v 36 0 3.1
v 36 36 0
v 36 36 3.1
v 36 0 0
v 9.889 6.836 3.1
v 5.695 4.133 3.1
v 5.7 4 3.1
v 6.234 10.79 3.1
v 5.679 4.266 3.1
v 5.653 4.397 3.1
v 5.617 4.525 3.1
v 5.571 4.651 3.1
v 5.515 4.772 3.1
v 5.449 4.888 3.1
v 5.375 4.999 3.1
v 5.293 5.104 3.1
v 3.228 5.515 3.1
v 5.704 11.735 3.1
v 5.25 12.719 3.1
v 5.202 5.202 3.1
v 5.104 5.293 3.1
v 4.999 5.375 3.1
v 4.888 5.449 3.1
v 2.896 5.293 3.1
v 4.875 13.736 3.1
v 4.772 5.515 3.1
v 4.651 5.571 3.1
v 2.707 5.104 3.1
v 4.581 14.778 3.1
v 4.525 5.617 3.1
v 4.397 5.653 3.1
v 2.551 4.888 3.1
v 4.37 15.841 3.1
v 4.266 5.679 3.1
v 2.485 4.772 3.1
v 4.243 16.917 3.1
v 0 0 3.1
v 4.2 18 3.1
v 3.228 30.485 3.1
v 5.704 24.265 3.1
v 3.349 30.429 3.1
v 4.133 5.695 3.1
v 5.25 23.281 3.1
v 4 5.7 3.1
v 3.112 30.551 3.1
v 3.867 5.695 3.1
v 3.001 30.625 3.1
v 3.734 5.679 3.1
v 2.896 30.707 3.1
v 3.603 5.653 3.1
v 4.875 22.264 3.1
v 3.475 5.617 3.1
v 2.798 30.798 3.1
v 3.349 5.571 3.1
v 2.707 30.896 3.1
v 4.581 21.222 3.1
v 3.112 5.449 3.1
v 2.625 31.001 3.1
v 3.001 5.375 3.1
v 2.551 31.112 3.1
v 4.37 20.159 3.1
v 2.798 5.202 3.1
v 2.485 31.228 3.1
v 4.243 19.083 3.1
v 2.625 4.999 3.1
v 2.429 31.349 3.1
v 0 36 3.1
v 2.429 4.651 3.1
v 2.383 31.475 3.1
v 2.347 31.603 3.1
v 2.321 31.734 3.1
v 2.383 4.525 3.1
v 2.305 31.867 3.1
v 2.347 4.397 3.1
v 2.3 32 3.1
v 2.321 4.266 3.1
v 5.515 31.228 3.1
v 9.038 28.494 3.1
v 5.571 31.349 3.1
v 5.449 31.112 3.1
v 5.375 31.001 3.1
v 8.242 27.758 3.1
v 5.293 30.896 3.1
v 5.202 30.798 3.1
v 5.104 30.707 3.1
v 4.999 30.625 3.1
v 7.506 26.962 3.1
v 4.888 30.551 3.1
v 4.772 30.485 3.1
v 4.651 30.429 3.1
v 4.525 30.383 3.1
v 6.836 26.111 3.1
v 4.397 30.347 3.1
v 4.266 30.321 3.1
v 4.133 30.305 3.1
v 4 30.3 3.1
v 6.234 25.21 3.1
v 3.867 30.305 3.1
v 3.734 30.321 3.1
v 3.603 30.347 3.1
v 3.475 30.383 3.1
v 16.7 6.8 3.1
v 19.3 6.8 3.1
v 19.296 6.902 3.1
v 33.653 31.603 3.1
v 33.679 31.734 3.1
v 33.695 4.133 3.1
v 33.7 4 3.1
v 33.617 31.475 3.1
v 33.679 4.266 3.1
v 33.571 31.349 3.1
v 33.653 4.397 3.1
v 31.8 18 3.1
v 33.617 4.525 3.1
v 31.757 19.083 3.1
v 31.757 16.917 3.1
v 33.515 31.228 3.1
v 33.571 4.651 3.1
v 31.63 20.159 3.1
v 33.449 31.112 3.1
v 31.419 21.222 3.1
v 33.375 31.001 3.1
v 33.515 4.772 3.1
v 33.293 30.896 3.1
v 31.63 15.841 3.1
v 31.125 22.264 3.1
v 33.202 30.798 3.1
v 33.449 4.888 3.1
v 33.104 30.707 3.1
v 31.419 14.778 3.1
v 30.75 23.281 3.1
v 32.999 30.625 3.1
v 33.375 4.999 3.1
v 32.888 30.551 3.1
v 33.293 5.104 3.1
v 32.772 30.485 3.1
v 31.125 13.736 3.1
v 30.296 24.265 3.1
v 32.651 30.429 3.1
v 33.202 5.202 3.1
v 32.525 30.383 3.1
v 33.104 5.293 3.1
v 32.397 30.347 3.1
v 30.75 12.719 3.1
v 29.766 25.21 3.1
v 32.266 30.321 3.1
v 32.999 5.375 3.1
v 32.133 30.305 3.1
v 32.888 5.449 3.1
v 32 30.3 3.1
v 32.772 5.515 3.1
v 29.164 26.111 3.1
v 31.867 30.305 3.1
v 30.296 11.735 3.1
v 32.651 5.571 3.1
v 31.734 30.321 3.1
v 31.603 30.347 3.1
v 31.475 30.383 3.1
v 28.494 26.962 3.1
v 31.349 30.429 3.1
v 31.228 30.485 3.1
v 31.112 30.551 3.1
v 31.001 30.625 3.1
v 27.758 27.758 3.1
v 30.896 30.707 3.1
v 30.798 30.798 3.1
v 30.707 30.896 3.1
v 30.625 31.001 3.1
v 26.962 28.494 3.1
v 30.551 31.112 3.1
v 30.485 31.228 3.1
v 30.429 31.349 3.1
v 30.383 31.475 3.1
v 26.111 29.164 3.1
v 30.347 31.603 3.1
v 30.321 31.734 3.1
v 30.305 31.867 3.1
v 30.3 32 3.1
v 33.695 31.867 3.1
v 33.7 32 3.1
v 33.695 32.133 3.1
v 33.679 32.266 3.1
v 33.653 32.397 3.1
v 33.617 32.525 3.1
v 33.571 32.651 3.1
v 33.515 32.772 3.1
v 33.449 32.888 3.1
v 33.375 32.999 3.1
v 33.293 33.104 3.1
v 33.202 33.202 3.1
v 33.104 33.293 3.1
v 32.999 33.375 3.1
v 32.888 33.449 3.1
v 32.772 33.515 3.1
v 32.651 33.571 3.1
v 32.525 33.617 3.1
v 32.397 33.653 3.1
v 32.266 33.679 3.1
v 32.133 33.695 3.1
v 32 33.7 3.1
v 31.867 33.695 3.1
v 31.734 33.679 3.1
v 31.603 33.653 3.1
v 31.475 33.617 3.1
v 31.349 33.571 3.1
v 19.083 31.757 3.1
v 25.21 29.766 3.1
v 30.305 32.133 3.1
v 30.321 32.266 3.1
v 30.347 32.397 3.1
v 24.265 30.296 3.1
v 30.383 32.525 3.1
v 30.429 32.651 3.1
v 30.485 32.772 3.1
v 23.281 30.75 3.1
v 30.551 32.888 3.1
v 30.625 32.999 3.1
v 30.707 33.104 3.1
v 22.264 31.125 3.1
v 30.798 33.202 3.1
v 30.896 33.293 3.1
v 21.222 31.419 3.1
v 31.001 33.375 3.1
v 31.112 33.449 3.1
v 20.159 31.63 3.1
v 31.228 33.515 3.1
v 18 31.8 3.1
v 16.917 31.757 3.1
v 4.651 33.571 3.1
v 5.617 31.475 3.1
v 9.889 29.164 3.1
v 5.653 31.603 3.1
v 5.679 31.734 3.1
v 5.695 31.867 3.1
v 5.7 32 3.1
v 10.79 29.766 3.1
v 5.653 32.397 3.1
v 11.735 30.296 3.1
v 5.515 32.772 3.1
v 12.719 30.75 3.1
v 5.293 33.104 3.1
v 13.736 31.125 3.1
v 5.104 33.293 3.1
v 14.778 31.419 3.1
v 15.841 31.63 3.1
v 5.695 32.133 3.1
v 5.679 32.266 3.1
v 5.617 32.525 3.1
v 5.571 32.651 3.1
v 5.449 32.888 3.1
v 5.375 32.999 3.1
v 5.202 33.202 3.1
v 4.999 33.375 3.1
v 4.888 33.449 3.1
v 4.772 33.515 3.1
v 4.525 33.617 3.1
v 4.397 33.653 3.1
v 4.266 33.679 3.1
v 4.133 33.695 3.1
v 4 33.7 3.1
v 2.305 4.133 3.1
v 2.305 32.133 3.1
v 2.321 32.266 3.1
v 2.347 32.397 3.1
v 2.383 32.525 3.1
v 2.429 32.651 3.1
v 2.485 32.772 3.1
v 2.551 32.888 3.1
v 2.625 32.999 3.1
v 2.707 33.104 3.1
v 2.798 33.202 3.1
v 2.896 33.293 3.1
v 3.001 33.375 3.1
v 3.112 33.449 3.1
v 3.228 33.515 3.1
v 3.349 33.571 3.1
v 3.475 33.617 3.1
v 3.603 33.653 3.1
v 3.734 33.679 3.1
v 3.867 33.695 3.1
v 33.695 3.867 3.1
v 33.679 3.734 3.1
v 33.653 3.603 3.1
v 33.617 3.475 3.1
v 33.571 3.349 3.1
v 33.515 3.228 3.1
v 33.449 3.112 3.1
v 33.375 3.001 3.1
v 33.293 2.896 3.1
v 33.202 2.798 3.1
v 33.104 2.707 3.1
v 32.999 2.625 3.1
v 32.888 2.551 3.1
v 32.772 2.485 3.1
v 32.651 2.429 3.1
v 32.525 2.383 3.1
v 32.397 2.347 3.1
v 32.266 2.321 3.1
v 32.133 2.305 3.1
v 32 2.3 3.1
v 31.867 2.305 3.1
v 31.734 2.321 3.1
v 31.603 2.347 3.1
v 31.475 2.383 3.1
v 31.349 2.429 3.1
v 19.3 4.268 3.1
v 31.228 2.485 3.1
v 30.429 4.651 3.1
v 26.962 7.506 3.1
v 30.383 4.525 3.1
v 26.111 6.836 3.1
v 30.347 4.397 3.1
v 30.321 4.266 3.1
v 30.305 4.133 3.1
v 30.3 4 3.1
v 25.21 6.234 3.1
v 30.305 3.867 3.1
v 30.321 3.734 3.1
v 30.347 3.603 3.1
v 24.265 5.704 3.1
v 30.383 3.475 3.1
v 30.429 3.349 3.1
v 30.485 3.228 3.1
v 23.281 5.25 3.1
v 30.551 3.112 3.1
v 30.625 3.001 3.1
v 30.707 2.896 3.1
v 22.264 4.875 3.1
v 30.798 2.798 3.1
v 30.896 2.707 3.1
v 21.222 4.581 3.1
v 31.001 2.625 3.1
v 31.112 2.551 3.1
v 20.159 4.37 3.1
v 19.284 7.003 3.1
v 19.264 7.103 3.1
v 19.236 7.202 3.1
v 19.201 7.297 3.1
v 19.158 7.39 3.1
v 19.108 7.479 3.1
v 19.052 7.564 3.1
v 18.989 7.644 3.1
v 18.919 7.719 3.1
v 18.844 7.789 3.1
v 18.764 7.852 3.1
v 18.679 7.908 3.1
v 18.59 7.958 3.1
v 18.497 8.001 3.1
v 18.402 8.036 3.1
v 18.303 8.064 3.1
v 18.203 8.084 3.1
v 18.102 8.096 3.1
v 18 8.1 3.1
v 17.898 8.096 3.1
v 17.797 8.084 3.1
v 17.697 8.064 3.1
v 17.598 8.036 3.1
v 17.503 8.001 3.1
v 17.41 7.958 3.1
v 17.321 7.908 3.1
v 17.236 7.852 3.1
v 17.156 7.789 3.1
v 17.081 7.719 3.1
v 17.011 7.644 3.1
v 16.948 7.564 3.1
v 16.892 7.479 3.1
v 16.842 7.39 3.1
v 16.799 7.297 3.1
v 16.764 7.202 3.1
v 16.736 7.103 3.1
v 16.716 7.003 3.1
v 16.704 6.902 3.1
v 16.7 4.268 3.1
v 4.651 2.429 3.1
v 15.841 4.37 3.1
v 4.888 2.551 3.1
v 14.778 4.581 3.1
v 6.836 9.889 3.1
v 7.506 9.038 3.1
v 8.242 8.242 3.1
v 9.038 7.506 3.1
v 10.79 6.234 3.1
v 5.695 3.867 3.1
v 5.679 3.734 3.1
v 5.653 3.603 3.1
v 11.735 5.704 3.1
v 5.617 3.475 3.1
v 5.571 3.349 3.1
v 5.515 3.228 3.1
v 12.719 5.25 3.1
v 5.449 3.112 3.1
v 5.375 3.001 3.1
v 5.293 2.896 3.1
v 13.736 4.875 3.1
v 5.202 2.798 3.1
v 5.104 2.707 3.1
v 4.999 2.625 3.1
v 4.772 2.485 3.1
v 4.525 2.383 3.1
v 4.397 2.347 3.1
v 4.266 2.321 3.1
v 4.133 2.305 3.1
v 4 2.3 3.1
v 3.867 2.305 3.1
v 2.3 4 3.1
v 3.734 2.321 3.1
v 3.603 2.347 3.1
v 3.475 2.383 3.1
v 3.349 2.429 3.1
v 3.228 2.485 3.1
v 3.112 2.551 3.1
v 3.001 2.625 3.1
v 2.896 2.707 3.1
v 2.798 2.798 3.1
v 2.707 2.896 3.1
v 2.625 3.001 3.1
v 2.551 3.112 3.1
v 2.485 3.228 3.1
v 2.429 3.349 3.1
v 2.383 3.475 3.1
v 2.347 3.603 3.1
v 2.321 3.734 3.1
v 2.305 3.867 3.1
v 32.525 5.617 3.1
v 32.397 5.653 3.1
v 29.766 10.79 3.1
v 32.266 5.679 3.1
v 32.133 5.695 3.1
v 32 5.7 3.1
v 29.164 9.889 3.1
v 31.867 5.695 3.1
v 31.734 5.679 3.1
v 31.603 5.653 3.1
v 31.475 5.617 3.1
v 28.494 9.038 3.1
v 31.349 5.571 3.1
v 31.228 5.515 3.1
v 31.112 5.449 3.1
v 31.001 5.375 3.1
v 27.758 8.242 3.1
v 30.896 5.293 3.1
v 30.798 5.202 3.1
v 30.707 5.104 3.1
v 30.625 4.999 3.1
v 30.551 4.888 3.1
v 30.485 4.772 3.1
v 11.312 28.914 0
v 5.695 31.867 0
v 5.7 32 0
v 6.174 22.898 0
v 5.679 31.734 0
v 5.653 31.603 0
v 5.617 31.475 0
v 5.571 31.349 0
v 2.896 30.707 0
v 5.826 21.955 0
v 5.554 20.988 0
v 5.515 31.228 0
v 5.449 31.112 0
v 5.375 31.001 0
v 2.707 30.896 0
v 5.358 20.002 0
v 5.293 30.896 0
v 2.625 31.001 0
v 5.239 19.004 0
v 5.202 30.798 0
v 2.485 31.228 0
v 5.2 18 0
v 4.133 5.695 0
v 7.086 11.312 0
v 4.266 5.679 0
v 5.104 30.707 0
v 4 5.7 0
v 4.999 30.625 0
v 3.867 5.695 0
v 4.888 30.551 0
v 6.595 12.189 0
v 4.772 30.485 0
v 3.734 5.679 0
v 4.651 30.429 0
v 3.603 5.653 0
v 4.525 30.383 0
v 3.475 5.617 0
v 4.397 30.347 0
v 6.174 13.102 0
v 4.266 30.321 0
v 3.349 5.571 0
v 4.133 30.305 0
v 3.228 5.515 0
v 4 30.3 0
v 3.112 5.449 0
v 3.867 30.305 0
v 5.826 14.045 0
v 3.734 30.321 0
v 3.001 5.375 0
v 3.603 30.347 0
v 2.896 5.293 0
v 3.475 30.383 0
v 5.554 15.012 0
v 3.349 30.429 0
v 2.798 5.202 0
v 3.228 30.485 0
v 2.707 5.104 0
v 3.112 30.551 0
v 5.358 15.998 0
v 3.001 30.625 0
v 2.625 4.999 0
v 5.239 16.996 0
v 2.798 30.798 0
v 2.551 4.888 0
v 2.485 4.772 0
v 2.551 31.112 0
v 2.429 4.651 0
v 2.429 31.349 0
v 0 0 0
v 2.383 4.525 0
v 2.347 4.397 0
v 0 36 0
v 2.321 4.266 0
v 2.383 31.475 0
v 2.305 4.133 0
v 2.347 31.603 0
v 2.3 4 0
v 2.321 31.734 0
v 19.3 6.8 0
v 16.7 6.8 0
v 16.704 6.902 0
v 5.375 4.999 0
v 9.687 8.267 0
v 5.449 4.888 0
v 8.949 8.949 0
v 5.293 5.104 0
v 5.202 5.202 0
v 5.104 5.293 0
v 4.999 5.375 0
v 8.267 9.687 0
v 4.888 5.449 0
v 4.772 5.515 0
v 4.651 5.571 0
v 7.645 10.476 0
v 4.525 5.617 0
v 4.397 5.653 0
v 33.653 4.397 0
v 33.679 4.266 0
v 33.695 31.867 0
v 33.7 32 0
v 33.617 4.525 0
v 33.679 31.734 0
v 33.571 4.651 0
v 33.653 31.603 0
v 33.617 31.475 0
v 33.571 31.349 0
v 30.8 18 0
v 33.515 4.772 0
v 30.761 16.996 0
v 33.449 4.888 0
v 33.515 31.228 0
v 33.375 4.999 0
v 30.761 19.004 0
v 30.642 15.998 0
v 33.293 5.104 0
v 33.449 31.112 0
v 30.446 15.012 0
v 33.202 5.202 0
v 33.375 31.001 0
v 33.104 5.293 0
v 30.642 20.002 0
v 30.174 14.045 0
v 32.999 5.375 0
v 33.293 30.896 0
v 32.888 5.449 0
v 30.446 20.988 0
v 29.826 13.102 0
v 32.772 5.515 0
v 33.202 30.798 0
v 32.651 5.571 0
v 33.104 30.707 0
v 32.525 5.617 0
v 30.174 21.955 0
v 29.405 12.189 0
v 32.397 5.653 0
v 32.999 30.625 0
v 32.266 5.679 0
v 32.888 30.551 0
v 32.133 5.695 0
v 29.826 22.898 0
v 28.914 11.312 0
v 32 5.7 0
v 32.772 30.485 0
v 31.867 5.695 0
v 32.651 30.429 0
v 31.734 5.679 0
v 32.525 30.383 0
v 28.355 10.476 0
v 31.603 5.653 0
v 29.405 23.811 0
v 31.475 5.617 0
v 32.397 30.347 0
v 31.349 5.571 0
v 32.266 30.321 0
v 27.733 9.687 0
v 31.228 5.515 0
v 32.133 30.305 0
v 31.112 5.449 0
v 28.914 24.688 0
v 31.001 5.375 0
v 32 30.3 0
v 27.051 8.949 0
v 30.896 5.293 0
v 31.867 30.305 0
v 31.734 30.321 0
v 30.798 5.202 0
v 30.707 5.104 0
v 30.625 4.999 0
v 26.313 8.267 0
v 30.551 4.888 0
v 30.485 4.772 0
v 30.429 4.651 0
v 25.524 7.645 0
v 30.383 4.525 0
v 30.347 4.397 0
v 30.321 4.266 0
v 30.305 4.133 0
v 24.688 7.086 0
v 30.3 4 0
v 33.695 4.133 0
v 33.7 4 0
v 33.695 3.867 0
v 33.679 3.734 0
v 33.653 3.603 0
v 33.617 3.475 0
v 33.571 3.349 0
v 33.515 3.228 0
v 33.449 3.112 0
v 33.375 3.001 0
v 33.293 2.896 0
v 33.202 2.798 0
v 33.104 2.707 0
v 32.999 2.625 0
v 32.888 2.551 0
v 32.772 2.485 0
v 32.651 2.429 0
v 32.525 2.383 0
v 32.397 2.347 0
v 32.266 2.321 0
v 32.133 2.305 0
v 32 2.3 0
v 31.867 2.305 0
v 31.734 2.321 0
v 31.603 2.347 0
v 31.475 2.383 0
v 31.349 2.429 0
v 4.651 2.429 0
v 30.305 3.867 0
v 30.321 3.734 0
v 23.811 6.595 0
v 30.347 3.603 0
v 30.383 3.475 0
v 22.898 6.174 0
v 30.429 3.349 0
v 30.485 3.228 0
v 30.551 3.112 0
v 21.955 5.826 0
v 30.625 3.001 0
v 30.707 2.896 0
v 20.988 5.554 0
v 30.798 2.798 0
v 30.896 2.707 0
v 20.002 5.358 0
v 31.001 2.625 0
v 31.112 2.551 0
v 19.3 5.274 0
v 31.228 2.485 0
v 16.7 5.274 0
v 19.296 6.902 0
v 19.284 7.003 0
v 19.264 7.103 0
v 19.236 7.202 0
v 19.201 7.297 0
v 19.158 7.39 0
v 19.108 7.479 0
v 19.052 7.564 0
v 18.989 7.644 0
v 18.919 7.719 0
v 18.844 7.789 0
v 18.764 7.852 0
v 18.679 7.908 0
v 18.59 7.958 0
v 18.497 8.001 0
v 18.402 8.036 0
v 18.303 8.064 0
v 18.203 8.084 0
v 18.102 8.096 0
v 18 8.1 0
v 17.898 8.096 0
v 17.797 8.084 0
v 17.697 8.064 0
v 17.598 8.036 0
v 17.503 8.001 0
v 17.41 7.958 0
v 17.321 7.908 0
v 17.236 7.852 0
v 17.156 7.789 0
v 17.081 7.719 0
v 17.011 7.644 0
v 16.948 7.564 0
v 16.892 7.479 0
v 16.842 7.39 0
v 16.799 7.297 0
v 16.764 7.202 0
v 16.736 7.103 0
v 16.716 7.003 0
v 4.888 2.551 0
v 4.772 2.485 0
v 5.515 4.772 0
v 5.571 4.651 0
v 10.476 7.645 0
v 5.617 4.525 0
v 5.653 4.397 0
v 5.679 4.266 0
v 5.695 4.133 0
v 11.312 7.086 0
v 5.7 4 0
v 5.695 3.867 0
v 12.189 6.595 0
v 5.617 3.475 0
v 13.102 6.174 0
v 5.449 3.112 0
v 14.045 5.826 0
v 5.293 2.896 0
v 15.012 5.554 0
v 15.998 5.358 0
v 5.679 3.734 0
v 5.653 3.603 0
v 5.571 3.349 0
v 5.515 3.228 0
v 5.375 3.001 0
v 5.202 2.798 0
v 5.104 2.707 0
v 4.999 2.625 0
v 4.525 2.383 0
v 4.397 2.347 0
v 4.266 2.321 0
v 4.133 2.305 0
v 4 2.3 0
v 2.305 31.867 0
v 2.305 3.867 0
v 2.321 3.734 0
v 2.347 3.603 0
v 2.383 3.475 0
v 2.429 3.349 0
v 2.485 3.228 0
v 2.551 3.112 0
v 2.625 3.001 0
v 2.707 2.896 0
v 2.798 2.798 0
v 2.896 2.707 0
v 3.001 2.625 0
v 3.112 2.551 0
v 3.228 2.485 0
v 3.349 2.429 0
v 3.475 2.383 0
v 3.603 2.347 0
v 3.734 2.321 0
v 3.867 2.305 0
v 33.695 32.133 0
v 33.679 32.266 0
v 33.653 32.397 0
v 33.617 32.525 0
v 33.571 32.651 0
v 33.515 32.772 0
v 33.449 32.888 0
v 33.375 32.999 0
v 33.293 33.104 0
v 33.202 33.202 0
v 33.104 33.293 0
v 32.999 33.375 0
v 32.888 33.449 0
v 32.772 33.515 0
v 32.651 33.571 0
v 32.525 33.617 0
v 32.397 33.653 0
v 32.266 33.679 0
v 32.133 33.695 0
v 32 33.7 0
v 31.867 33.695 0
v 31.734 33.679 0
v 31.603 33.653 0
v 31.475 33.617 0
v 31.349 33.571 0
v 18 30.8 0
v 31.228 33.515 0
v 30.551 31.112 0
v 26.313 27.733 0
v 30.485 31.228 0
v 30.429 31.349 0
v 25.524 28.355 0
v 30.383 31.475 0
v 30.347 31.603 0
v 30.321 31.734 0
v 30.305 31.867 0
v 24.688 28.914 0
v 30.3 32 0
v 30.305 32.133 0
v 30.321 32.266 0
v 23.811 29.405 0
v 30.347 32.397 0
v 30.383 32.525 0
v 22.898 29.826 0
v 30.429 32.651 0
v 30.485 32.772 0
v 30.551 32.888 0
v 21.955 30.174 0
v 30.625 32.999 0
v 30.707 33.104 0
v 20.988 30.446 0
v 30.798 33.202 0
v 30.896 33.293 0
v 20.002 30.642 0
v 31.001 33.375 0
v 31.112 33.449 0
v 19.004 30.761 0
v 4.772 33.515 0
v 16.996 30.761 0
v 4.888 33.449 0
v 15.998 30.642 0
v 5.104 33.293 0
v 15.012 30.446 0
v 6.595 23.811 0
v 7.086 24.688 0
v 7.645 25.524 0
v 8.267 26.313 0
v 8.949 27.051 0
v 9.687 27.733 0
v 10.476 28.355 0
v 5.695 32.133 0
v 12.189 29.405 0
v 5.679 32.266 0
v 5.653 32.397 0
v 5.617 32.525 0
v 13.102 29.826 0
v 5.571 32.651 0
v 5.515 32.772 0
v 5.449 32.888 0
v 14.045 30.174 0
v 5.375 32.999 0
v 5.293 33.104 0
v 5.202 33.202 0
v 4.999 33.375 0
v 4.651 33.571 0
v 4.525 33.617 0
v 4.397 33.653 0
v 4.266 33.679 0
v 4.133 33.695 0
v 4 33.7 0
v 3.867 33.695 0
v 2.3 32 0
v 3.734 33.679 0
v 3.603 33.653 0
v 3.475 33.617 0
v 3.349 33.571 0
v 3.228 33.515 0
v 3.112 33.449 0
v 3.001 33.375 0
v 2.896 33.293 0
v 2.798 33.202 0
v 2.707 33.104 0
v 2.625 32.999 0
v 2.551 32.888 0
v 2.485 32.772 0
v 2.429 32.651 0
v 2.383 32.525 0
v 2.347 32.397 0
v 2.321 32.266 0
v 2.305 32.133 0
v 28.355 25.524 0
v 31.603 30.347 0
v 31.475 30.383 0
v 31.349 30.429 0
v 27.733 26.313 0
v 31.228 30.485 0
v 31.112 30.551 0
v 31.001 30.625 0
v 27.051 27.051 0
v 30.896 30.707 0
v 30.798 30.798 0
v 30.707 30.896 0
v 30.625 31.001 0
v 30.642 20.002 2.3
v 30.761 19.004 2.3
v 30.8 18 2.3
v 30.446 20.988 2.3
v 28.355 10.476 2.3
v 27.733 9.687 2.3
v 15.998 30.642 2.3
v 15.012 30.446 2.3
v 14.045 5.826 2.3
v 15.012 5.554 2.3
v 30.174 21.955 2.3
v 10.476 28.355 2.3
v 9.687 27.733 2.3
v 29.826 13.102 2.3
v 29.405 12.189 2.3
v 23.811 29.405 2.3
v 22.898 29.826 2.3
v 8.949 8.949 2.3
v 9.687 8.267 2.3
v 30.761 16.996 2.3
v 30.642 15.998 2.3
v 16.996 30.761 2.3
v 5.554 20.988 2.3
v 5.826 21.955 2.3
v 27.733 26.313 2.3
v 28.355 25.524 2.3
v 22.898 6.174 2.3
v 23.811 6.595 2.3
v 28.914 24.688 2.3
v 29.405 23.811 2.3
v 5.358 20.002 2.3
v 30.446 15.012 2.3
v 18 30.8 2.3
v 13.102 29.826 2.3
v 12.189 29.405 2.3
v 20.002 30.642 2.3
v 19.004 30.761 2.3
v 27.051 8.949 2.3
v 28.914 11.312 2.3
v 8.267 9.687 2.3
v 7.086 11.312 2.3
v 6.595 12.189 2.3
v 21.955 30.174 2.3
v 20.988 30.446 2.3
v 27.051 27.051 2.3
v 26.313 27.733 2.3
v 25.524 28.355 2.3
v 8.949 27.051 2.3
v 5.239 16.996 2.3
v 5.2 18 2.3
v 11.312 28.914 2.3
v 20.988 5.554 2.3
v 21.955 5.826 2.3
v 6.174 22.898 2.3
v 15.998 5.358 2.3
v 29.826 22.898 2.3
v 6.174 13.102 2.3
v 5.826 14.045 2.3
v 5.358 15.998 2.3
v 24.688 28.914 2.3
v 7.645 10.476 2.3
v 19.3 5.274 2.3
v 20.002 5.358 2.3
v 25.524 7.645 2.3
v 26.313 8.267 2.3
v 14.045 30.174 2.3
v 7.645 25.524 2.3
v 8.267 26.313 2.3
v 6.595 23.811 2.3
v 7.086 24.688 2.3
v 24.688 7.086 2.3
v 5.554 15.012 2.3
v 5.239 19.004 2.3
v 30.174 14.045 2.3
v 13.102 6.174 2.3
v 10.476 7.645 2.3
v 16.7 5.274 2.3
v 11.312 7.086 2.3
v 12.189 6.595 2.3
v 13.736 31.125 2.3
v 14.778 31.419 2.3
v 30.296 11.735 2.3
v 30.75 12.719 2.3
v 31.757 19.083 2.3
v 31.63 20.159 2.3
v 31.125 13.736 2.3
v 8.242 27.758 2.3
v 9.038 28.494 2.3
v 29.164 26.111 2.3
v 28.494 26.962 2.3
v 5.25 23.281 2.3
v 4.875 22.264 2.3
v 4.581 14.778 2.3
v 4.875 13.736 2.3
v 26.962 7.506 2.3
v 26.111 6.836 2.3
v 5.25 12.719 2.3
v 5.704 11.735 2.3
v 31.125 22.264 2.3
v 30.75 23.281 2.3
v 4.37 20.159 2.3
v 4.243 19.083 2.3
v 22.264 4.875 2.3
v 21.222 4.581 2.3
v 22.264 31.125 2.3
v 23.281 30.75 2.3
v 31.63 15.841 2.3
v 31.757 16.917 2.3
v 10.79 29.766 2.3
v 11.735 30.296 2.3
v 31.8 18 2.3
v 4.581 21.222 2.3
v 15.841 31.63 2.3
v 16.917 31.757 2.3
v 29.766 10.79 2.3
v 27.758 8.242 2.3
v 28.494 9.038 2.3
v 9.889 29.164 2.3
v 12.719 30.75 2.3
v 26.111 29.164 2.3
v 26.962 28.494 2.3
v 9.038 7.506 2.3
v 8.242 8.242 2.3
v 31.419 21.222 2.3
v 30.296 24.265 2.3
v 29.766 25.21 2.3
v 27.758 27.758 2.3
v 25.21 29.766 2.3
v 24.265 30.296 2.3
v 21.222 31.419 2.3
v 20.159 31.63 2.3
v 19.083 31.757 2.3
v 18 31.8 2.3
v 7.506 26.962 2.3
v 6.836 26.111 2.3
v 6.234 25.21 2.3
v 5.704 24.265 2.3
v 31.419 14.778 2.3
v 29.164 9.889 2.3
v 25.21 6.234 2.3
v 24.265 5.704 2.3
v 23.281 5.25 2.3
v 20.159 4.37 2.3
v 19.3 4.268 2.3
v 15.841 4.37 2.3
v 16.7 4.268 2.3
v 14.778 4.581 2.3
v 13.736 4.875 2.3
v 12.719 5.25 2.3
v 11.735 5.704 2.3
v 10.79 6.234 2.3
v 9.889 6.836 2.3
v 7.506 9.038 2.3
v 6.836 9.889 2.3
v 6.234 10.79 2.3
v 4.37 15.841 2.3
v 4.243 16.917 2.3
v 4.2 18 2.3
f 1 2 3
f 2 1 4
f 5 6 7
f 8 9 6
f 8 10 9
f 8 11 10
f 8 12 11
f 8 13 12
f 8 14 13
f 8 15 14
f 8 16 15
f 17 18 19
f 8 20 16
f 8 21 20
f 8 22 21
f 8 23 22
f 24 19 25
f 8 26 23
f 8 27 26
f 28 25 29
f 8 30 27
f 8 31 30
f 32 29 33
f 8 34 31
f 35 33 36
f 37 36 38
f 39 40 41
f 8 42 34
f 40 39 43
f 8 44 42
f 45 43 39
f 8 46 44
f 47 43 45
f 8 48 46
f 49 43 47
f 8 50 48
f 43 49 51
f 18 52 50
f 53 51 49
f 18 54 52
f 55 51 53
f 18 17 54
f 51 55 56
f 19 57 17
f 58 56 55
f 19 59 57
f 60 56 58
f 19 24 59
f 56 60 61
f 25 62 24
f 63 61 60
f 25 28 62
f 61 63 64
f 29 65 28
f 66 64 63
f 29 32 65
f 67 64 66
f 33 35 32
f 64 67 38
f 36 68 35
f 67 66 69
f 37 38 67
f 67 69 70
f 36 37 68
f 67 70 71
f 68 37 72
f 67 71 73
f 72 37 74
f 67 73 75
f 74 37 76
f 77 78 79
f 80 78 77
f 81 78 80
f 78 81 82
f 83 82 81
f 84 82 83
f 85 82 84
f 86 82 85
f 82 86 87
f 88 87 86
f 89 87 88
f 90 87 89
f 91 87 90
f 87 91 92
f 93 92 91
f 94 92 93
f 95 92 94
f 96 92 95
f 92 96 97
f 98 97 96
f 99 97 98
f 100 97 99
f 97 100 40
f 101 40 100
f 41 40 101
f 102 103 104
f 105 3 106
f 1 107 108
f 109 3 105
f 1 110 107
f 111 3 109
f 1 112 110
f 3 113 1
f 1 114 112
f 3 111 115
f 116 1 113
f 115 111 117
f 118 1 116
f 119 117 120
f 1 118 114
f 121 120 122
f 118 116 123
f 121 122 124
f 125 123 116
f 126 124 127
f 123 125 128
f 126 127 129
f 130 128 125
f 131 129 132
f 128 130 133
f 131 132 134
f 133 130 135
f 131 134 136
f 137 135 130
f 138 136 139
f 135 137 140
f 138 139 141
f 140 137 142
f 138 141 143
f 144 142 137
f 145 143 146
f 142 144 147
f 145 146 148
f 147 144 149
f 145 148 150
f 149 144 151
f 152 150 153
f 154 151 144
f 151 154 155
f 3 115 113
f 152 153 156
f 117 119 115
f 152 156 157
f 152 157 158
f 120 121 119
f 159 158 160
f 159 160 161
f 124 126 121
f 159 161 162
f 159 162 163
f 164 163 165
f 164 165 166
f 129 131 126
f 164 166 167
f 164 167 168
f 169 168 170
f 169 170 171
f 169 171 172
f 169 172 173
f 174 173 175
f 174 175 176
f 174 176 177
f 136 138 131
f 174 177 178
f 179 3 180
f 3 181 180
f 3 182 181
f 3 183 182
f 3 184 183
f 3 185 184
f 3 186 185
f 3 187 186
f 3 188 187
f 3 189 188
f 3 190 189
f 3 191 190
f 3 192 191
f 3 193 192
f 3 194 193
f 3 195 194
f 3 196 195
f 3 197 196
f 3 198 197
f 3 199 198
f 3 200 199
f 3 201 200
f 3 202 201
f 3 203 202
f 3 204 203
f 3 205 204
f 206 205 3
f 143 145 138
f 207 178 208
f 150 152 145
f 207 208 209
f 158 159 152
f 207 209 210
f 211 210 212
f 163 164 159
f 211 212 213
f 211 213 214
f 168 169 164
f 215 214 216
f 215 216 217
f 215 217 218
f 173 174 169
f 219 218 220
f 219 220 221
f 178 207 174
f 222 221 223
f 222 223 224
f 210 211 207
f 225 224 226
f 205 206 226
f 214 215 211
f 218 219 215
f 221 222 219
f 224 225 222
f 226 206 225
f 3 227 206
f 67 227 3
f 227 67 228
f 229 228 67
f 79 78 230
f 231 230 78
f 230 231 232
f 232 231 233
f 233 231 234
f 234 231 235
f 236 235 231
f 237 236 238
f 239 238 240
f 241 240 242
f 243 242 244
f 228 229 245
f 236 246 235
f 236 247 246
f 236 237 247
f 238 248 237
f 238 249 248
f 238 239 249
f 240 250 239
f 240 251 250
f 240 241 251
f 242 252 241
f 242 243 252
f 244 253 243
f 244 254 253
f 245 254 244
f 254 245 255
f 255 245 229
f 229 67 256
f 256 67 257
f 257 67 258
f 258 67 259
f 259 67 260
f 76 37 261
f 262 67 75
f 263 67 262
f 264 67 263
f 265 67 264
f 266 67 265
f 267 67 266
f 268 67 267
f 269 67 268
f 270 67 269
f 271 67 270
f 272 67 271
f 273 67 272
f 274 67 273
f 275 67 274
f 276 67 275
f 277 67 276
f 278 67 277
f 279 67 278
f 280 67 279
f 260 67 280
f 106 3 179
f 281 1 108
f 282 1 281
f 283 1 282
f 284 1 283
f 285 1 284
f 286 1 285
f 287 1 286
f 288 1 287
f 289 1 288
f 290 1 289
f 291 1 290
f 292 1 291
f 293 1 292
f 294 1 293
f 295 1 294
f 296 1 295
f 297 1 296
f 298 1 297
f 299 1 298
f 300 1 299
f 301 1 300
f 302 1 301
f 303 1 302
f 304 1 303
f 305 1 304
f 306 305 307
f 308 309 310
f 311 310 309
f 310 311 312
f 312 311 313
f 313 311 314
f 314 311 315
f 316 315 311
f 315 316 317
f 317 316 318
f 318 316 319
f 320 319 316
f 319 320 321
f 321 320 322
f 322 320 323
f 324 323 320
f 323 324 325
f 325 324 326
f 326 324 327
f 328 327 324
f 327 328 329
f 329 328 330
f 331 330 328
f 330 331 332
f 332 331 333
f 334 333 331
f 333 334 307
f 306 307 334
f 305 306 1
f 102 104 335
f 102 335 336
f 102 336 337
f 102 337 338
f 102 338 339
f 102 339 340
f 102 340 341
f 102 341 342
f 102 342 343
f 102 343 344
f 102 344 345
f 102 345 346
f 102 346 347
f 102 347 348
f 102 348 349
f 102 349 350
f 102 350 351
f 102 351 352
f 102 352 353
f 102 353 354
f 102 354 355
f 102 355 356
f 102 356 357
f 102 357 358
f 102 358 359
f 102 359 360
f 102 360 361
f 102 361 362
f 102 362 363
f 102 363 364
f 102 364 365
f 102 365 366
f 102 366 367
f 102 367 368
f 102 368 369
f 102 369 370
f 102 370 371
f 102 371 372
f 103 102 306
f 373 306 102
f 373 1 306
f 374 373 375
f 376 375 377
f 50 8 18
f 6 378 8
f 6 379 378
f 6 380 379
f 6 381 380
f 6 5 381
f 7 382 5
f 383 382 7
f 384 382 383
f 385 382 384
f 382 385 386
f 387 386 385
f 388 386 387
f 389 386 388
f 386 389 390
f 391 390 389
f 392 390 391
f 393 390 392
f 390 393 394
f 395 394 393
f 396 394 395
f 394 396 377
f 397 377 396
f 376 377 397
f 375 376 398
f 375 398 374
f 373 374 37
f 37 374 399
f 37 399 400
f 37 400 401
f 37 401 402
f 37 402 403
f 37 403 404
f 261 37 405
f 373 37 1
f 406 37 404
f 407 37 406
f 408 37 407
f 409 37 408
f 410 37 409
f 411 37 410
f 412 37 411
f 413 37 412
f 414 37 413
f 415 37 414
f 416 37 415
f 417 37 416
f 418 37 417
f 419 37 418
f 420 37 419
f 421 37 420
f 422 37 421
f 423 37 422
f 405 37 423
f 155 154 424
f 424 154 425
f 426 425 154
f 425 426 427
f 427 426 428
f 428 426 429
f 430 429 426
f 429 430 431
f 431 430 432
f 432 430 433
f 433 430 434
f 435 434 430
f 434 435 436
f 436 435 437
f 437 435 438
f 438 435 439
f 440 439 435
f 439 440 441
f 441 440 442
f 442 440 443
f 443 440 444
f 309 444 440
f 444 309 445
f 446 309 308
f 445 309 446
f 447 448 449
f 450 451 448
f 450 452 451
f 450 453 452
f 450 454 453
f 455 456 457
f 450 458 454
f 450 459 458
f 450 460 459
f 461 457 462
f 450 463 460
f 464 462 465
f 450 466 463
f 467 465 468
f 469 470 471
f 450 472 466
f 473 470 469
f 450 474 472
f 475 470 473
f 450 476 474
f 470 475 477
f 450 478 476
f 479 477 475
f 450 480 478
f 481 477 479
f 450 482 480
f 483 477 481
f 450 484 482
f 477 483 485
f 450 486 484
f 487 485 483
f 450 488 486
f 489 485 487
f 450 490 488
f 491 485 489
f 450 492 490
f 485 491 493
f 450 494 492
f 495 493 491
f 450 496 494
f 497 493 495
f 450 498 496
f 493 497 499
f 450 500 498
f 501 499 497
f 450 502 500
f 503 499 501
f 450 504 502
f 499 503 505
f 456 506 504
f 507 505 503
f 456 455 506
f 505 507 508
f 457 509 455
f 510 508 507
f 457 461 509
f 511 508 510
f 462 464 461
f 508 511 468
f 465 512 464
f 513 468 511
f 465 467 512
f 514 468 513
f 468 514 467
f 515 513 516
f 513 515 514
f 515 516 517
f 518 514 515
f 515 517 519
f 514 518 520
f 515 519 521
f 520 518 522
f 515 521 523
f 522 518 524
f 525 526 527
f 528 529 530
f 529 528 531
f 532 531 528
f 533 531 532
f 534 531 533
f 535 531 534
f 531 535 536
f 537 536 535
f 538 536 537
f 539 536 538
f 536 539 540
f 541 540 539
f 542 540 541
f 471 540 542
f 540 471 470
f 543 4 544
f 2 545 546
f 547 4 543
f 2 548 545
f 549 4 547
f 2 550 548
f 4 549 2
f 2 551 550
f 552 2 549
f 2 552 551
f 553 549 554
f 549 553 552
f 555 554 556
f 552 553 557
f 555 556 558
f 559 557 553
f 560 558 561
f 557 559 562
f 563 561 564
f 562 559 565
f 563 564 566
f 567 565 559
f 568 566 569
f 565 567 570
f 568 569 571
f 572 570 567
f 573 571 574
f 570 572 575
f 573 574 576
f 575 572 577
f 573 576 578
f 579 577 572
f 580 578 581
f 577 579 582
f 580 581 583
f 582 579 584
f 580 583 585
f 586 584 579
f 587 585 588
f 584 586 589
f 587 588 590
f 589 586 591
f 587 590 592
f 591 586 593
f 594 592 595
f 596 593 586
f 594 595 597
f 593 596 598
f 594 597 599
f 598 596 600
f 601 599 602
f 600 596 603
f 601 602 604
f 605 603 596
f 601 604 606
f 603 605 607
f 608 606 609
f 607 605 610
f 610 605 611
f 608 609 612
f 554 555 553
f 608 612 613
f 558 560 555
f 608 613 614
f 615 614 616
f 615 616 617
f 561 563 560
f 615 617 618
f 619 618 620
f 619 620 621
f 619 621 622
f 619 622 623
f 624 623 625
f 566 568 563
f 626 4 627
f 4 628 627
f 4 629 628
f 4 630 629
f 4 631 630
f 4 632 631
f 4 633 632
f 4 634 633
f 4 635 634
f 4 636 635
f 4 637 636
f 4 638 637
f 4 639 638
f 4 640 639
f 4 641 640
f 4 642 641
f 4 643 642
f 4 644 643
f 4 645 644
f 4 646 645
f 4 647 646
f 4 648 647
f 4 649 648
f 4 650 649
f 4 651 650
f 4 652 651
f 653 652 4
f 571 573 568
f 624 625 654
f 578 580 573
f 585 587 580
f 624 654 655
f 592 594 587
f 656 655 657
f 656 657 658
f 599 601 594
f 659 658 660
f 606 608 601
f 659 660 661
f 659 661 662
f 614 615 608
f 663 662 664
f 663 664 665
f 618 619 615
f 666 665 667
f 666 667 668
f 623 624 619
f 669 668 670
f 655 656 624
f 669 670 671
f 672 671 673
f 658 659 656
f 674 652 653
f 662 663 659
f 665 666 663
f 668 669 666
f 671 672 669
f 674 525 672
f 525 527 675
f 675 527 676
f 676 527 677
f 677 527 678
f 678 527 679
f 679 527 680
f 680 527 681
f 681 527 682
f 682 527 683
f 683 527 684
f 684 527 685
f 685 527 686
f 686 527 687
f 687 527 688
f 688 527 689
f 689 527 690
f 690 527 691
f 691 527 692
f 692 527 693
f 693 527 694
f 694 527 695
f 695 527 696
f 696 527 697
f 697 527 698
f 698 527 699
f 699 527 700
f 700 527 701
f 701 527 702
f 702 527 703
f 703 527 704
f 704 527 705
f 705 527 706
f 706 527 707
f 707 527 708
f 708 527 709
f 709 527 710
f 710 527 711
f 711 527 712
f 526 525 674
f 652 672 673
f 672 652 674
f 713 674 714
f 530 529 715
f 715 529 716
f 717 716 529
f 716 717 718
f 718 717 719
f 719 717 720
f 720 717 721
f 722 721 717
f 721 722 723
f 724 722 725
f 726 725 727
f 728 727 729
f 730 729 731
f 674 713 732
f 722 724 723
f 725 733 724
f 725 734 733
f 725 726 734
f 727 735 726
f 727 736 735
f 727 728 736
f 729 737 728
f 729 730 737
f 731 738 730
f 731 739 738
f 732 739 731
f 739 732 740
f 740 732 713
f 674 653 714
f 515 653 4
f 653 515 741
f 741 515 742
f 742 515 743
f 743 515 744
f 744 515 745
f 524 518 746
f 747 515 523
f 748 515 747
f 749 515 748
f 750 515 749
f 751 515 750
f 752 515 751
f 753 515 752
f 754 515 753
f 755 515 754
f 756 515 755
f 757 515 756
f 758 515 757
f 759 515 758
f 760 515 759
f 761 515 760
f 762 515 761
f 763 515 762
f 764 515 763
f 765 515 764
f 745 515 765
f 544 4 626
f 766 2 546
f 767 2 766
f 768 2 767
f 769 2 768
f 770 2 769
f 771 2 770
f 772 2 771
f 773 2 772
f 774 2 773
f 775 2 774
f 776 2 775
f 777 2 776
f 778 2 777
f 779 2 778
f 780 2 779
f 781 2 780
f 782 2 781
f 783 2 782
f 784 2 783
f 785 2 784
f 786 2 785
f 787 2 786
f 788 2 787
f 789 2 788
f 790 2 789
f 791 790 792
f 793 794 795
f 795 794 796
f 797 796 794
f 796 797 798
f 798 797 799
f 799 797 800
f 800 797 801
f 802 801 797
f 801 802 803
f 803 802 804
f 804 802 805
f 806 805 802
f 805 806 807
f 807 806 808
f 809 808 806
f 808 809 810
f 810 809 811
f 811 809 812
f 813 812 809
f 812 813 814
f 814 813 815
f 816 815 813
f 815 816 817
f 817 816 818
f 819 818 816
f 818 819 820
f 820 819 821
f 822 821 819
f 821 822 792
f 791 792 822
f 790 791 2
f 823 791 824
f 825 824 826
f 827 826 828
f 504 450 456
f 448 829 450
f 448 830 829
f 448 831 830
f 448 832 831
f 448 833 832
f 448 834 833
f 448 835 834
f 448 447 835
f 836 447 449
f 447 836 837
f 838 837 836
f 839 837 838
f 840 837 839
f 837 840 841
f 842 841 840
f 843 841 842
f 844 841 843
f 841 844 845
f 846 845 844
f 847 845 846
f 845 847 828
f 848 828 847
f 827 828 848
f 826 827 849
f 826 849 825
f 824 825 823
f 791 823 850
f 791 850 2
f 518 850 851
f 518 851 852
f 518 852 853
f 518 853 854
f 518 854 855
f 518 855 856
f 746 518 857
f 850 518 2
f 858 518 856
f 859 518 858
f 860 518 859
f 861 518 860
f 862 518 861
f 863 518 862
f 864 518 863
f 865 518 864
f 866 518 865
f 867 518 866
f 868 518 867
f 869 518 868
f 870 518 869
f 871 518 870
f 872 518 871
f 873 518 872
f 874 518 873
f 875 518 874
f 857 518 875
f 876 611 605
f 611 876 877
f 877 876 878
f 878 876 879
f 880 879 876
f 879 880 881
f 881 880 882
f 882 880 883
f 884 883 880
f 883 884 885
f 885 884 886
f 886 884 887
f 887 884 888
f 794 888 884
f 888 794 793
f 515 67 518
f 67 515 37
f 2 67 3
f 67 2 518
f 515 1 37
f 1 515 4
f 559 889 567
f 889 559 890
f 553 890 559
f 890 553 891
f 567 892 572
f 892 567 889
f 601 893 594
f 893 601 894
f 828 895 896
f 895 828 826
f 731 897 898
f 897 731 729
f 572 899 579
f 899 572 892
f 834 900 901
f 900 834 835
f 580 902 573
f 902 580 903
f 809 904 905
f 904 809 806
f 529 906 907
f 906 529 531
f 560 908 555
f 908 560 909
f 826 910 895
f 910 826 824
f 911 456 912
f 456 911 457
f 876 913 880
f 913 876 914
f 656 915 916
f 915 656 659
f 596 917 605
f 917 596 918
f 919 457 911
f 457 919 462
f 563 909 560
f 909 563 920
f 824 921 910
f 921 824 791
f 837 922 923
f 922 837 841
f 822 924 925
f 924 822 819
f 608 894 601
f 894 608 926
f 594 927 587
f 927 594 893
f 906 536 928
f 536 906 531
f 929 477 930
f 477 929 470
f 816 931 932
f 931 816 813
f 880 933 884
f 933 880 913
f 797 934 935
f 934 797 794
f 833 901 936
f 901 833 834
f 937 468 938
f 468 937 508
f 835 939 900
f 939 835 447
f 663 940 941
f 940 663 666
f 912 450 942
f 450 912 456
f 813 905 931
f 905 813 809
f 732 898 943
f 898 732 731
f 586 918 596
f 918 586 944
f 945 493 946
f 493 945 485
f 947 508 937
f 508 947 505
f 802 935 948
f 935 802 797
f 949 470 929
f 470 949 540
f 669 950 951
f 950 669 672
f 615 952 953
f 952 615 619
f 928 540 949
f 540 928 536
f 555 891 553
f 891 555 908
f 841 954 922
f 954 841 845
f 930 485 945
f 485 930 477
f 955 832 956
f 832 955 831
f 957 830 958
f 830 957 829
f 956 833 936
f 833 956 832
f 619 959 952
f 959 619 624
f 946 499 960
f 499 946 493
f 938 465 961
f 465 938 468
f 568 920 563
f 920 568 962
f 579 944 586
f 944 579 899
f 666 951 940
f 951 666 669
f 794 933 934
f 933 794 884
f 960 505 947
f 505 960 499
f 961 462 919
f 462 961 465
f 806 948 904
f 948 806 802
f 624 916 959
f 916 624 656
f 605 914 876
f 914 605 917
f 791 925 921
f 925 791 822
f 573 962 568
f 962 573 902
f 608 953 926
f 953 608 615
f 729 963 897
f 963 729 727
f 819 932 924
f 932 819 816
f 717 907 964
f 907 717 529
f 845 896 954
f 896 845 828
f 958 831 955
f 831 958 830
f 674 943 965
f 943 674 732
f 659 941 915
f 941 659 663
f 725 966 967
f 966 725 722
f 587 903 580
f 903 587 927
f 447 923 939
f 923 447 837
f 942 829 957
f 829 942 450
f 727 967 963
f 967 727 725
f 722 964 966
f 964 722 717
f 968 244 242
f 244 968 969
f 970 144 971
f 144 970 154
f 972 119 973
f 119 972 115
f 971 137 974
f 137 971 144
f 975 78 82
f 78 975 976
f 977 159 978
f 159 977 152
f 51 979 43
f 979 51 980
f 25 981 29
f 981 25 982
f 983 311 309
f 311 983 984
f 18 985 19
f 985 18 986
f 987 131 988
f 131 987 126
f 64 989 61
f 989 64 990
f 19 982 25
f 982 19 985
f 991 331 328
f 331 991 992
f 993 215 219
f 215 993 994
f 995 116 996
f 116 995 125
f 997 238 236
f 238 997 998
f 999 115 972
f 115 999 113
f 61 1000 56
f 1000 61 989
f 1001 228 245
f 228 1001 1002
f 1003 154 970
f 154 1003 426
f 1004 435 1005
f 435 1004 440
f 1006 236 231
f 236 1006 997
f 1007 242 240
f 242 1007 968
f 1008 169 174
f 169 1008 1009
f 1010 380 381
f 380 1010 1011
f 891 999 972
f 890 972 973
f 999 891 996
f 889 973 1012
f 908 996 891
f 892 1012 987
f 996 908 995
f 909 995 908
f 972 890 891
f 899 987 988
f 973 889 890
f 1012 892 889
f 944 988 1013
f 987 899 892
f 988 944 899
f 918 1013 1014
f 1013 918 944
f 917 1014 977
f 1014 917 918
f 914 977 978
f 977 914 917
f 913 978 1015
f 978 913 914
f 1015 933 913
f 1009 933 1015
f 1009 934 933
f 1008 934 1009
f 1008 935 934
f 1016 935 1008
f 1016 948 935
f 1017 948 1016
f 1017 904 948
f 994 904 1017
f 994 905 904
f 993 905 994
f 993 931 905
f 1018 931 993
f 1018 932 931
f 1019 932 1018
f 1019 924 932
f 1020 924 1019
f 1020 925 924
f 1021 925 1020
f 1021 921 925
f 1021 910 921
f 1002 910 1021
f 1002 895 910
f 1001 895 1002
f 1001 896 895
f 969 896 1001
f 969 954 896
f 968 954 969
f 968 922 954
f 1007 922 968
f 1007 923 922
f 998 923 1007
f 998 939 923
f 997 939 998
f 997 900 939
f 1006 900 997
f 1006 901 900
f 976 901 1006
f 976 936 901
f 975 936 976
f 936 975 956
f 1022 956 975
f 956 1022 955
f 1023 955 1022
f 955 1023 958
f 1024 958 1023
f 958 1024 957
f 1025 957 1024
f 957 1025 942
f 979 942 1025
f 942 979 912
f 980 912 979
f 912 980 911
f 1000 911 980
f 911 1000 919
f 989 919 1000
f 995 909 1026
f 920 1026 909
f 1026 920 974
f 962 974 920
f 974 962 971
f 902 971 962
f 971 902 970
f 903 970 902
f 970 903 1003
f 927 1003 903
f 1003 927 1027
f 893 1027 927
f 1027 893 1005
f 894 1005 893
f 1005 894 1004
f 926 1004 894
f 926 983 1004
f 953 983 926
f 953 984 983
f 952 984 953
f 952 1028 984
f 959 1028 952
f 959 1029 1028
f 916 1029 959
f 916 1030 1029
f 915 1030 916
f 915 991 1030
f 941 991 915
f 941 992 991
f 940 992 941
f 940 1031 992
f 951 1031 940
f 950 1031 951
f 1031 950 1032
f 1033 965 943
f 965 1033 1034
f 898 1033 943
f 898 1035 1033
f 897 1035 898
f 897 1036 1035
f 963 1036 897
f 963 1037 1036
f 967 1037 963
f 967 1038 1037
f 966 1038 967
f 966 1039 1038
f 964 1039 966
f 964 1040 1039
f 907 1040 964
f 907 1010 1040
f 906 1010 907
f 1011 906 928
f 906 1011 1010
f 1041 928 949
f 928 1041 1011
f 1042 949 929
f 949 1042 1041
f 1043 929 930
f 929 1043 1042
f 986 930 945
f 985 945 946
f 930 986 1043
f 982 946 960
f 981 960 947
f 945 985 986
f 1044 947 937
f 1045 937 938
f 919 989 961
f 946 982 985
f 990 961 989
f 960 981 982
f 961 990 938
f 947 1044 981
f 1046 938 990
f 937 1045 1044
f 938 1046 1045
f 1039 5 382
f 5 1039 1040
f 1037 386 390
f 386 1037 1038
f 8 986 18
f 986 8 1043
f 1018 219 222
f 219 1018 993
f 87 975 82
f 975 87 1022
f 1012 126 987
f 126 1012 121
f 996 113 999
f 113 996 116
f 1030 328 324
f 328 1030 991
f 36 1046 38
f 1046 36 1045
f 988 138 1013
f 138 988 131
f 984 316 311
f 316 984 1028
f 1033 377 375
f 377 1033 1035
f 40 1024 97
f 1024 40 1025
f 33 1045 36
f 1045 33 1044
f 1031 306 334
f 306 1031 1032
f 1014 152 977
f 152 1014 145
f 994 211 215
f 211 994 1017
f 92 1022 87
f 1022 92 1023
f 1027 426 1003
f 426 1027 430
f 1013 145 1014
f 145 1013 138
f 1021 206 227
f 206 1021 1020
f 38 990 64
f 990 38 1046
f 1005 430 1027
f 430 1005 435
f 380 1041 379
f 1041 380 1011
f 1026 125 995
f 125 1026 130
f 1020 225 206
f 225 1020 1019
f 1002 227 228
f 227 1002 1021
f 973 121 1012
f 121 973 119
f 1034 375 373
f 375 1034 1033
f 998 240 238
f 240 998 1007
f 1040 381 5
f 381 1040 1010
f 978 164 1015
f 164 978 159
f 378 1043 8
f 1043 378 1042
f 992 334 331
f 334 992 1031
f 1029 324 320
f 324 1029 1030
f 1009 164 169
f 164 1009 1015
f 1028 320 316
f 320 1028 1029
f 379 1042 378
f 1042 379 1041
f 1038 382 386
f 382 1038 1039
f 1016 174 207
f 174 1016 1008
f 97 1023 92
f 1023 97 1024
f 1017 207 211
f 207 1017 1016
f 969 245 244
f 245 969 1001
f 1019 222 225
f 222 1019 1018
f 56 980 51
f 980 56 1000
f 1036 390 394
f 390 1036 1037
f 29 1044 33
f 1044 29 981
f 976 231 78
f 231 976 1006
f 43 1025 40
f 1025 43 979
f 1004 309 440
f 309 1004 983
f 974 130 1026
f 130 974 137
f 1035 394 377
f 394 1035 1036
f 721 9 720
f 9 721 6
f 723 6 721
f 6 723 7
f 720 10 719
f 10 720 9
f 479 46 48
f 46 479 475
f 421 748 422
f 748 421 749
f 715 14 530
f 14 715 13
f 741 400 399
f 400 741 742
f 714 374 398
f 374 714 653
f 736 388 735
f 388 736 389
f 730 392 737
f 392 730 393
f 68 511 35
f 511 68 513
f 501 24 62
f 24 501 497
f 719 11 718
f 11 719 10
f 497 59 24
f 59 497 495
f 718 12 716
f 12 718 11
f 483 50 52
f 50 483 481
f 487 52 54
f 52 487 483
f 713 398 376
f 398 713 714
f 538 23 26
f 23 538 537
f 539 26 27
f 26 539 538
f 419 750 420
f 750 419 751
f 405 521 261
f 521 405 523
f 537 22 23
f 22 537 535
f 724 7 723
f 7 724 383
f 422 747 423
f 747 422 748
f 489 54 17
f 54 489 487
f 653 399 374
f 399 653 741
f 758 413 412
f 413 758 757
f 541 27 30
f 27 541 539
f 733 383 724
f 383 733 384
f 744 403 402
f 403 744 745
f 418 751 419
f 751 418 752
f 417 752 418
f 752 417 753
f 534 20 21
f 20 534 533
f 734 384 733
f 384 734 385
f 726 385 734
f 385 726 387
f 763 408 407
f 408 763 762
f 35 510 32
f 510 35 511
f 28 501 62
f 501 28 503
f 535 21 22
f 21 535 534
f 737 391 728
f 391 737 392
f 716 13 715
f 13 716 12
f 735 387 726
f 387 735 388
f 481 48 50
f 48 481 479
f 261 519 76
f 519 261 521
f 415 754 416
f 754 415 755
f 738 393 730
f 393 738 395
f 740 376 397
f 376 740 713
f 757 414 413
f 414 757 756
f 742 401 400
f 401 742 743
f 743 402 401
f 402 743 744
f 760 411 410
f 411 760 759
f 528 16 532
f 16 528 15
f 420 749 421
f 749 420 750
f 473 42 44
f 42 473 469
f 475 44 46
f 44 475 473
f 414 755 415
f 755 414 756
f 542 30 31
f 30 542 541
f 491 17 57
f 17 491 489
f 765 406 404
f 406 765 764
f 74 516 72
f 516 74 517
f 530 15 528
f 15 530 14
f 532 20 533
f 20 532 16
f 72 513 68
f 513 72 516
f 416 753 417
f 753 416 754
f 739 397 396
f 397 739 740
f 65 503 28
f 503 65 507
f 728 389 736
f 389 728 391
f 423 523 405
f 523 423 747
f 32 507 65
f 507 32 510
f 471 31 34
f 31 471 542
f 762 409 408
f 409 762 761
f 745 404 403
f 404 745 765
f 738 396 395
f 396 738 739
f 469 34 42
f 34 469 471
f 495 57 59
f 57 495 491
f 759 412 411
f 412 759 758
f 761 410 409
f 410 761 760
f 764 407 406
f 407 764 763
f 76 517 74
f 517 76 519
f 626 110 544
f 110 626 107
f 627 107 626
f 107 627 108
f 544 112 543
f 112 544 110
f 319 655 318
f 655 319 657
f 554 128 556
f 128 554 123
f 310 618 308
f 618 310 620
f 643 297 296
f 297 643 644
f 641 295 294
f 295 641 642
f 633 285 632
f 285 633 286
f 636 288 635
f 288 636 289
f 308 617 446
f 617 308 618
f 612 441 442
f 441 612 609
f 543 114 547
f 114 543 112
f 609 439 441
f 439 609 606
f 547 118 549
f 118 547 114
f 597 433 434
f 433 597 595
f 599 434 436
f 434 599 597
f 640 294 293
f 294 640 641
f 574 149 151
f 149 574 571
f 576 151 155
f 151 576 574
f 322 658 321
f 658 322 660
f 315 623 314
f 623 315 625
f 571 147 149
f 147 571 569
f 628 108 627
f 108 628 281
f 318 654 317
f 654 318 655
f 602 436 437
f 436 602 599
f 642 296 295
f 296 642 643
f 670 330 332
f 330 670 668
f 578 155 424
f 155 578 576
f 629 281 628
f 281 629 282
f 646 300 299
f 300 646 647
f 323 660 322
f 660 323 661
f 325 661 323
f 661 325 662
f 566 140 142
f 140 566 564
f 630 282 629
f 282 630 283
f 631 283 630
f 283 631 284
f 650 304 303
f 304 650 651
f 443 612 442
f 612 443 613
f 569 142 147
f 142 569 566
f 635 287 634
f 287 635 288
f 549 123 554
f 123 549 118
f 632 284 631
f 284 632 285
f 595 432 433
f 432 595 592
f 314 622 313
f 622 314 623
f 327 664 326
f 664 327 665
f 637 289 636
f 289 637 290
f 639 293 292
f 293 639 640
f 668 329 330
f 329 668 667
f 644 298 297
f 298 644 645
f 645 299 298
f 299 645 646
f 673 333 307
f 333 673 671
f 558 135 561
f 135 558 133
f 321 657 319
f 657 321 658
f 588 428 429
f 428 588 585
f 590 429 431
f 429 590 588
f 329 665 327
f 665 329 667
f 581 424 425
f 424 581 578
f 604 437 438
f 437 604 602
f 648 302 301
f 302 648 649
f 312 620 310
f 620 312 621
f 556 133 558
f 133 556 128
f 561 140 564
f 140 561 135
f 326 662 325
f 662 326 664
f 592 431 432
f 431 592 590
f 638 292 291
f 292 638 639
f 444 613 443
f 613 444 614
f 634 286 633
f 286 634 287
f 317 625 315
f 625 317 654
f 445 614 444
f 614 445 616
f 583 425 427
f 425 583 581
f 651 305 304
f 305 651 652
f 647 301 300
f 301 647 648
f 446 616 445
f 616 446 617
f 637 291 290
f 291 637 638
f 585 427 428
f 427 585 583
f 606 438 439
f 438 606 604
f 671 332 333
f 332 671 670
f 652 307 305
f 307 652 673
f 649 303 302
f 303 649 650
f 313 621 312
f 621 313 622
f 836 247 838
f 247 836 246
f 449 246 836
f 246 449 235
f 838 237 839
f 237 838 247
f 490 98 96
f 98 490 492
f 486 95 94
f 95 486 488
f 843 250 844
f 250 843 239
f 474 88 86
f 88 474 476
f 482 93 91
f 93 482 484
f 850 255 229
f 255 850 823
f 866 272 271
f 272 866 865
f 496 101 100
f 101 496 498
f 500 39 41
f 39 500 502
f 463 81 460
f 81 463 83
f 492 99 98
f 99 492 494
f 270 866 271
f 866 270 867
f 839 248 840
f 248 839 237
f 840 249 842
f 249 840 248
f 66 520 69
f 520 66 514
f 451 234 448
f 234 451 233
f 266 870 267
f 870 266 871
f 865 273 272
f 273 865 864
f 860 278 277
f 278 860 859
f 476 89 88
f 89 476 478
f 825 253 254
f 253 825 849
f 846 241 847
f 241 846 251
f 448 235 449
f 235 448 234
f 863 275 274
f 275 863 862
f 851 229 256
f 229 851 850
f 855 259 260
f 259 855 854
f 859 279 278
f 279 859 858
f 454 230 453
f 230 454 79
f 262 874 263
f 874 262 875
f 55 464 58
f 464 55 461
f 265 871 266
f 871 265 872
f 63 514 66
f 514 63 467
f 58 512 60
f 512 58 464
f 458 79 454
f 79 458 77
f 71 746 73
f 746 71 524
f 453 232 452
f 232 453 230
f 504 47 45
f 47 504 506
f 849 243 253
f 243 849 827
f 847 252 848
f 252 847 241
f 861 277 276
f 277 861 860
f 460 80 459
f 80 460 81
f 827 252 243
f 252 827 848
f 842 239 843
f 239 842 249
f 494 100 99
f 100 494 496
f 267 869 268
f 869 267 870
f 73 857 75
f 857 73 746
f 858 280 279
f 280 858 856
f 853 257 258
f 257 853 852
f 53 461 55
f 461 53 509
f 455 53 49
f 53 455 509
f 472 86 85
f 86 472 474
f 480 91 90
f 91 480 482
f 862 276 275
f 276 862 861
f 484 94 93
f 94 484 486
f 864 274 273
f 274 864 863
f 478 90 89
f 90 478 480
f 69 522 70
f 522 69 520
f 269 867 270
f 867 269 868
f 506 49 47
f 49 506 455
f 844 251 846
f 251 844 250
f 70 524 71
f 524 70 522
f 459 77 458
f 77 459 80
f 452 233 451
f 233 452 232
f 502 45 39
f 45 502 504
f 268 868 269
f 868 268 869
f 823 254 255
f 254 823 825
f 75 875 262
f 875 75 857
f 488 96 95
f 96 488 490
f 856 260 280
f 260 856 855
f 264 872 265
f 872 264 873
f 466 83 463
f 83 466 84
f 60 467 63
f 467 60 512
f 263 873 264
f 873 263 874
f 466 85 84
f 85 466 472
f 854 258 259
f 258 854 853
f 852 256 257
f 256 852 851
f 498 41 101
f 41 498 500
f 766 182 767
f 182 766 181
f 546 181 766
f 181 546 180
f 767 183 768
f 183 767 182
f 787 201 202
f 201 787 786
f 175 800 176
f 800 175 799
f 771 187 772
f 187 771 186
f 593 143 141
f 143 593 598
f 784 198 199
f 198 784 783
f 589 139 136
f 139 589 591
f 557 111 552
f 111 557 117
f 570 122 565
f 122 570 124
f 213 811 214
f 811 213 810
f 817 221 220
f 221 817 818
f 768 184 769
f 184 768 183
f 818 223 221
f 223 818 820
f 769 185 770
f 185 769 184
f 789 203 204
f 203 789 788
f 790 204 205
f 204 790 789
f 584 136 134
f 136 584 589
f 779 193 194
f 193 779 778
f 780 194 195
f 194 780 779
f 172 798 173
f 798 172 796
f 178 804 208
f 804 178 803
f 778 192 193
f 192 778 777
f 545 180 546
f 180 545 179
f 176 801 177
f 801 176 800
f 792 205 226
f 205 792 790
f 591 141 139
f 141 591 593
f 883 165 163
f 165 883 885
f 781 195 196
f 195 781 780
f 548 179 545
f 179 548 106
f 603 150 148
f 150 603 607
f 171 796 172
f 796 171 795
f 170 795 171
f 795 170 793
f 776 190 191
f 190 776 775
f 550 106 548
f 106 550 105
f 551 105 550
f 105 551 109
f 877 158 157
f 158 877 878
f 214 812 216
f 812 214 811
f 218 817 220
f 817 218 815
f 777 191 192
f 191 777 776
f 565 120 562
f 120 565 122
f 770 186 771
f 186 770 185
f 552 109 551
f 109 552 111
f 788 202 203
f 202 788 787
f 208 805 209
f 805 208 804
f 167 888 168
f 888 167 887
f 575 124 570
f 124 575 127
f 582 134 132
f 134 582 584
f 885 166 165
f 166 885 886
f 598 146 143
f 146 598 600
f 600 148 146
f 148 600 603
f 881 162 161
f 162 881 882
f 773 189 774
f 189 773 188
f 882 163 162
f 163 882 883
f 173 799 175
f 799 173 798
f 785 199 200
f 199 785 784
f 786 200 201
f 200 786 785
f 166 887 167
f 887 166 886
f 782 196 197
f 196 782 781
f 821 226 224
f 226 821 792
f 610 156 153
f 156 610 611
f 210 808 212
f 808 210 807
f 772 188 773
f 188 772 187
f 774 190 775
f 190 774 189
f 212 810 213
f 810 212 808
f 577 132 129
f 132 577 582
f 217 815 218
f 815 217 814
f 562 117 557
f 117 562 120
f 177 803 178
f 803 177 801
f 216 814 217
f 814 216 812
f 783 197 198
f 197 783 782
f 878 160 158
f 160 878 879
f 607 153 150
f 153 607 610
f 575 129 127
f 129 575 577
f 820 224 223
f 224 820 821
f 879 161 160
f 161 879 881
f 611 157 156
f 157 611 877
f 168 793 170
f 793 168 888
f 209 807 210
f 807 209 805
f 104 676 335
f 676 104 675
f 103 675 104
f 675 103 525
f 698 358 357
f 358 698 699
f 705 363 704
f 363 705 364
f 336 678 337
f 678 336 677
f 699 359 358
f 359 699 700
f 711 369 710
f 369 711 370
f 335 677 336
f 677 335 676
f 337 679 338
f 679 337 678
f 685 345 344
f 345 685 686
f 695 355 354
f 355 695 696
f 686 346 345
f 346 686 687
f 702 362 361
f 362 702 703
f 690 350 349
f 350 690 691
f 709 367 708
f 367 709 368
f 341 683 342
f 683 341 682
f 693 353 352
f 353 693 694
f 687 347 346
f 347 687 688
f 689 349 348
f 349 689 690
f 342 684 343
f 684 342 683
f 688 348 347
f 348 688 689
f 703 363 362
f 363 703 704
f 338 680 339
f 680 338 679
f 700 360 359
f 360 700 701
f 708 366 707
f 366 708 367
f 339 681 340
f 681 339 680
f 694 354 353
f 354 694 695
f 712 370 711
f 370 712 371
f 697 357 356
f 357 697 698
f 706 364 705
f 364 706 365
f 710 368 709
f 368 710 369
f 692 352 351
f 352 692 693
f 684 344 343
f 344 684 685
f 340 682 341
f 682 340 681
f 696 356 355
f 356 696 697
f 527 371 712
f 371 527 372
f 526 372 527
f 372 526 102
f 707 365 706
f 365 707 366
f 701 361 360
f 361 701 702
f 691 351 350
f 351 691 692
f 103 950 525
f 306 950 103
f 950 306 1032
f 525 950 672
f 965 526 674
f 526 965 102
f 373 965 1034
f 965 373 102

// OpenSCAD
$fn=80;

//COB LED holder
dHolder=36;
hHolder=3.1; // Adjust for first layer  h=0.3mm
dCOB=27.6; // Specified size =26mm but actually a bit bigger
rCOB=dCOB/2;
dRetain=dCOB-2;

rRetain=dRetain/2;
hCOB=0.8; 
adjust=2.6; // To adjust the position of the notch

dNotch=2.6;
yNotch=dHolder/2-rCOB+adjust;

dHole=3.4; //Mounting hole for M3 screw
pHole=4; //Mount hole distance from the edge

difference () {
cube([dHolder,dHolder,hHolder]);
    translate([dHolder/2,dHolder/2,0]){
        cylinder(h=hHolder,d=dRetain);
    }
    translate([dHolder/2,dHolder/2,hHolder-hCOB]){    
    cylinder(h=hCOB,d=dCOB);
    }
    translate([pHole,pHole,0]){cylinder(h=hHolder,d=dHole);}
    translate([dHolder-pHole,pHole,0]){cylinder(h=hHolder,d=dHole);}
    translate([pHole,dHolder-pHole,0]){cylinder(h=hHolder,d=dHole);}
    translate([dHolder-pHole,dHolder-pHole,0]){cylinder(h=hHolder,d=dHole);}
  }
translate([dHolder/2,dHolder/2-rCOB+adjust,0]) {
    cylinder(h=hHolder,d=dNotch);
    }
translate([dHolder/2-dNotch/2,0,0]) {    
    cube([dNotch,yNotch,hHolder]);
}
